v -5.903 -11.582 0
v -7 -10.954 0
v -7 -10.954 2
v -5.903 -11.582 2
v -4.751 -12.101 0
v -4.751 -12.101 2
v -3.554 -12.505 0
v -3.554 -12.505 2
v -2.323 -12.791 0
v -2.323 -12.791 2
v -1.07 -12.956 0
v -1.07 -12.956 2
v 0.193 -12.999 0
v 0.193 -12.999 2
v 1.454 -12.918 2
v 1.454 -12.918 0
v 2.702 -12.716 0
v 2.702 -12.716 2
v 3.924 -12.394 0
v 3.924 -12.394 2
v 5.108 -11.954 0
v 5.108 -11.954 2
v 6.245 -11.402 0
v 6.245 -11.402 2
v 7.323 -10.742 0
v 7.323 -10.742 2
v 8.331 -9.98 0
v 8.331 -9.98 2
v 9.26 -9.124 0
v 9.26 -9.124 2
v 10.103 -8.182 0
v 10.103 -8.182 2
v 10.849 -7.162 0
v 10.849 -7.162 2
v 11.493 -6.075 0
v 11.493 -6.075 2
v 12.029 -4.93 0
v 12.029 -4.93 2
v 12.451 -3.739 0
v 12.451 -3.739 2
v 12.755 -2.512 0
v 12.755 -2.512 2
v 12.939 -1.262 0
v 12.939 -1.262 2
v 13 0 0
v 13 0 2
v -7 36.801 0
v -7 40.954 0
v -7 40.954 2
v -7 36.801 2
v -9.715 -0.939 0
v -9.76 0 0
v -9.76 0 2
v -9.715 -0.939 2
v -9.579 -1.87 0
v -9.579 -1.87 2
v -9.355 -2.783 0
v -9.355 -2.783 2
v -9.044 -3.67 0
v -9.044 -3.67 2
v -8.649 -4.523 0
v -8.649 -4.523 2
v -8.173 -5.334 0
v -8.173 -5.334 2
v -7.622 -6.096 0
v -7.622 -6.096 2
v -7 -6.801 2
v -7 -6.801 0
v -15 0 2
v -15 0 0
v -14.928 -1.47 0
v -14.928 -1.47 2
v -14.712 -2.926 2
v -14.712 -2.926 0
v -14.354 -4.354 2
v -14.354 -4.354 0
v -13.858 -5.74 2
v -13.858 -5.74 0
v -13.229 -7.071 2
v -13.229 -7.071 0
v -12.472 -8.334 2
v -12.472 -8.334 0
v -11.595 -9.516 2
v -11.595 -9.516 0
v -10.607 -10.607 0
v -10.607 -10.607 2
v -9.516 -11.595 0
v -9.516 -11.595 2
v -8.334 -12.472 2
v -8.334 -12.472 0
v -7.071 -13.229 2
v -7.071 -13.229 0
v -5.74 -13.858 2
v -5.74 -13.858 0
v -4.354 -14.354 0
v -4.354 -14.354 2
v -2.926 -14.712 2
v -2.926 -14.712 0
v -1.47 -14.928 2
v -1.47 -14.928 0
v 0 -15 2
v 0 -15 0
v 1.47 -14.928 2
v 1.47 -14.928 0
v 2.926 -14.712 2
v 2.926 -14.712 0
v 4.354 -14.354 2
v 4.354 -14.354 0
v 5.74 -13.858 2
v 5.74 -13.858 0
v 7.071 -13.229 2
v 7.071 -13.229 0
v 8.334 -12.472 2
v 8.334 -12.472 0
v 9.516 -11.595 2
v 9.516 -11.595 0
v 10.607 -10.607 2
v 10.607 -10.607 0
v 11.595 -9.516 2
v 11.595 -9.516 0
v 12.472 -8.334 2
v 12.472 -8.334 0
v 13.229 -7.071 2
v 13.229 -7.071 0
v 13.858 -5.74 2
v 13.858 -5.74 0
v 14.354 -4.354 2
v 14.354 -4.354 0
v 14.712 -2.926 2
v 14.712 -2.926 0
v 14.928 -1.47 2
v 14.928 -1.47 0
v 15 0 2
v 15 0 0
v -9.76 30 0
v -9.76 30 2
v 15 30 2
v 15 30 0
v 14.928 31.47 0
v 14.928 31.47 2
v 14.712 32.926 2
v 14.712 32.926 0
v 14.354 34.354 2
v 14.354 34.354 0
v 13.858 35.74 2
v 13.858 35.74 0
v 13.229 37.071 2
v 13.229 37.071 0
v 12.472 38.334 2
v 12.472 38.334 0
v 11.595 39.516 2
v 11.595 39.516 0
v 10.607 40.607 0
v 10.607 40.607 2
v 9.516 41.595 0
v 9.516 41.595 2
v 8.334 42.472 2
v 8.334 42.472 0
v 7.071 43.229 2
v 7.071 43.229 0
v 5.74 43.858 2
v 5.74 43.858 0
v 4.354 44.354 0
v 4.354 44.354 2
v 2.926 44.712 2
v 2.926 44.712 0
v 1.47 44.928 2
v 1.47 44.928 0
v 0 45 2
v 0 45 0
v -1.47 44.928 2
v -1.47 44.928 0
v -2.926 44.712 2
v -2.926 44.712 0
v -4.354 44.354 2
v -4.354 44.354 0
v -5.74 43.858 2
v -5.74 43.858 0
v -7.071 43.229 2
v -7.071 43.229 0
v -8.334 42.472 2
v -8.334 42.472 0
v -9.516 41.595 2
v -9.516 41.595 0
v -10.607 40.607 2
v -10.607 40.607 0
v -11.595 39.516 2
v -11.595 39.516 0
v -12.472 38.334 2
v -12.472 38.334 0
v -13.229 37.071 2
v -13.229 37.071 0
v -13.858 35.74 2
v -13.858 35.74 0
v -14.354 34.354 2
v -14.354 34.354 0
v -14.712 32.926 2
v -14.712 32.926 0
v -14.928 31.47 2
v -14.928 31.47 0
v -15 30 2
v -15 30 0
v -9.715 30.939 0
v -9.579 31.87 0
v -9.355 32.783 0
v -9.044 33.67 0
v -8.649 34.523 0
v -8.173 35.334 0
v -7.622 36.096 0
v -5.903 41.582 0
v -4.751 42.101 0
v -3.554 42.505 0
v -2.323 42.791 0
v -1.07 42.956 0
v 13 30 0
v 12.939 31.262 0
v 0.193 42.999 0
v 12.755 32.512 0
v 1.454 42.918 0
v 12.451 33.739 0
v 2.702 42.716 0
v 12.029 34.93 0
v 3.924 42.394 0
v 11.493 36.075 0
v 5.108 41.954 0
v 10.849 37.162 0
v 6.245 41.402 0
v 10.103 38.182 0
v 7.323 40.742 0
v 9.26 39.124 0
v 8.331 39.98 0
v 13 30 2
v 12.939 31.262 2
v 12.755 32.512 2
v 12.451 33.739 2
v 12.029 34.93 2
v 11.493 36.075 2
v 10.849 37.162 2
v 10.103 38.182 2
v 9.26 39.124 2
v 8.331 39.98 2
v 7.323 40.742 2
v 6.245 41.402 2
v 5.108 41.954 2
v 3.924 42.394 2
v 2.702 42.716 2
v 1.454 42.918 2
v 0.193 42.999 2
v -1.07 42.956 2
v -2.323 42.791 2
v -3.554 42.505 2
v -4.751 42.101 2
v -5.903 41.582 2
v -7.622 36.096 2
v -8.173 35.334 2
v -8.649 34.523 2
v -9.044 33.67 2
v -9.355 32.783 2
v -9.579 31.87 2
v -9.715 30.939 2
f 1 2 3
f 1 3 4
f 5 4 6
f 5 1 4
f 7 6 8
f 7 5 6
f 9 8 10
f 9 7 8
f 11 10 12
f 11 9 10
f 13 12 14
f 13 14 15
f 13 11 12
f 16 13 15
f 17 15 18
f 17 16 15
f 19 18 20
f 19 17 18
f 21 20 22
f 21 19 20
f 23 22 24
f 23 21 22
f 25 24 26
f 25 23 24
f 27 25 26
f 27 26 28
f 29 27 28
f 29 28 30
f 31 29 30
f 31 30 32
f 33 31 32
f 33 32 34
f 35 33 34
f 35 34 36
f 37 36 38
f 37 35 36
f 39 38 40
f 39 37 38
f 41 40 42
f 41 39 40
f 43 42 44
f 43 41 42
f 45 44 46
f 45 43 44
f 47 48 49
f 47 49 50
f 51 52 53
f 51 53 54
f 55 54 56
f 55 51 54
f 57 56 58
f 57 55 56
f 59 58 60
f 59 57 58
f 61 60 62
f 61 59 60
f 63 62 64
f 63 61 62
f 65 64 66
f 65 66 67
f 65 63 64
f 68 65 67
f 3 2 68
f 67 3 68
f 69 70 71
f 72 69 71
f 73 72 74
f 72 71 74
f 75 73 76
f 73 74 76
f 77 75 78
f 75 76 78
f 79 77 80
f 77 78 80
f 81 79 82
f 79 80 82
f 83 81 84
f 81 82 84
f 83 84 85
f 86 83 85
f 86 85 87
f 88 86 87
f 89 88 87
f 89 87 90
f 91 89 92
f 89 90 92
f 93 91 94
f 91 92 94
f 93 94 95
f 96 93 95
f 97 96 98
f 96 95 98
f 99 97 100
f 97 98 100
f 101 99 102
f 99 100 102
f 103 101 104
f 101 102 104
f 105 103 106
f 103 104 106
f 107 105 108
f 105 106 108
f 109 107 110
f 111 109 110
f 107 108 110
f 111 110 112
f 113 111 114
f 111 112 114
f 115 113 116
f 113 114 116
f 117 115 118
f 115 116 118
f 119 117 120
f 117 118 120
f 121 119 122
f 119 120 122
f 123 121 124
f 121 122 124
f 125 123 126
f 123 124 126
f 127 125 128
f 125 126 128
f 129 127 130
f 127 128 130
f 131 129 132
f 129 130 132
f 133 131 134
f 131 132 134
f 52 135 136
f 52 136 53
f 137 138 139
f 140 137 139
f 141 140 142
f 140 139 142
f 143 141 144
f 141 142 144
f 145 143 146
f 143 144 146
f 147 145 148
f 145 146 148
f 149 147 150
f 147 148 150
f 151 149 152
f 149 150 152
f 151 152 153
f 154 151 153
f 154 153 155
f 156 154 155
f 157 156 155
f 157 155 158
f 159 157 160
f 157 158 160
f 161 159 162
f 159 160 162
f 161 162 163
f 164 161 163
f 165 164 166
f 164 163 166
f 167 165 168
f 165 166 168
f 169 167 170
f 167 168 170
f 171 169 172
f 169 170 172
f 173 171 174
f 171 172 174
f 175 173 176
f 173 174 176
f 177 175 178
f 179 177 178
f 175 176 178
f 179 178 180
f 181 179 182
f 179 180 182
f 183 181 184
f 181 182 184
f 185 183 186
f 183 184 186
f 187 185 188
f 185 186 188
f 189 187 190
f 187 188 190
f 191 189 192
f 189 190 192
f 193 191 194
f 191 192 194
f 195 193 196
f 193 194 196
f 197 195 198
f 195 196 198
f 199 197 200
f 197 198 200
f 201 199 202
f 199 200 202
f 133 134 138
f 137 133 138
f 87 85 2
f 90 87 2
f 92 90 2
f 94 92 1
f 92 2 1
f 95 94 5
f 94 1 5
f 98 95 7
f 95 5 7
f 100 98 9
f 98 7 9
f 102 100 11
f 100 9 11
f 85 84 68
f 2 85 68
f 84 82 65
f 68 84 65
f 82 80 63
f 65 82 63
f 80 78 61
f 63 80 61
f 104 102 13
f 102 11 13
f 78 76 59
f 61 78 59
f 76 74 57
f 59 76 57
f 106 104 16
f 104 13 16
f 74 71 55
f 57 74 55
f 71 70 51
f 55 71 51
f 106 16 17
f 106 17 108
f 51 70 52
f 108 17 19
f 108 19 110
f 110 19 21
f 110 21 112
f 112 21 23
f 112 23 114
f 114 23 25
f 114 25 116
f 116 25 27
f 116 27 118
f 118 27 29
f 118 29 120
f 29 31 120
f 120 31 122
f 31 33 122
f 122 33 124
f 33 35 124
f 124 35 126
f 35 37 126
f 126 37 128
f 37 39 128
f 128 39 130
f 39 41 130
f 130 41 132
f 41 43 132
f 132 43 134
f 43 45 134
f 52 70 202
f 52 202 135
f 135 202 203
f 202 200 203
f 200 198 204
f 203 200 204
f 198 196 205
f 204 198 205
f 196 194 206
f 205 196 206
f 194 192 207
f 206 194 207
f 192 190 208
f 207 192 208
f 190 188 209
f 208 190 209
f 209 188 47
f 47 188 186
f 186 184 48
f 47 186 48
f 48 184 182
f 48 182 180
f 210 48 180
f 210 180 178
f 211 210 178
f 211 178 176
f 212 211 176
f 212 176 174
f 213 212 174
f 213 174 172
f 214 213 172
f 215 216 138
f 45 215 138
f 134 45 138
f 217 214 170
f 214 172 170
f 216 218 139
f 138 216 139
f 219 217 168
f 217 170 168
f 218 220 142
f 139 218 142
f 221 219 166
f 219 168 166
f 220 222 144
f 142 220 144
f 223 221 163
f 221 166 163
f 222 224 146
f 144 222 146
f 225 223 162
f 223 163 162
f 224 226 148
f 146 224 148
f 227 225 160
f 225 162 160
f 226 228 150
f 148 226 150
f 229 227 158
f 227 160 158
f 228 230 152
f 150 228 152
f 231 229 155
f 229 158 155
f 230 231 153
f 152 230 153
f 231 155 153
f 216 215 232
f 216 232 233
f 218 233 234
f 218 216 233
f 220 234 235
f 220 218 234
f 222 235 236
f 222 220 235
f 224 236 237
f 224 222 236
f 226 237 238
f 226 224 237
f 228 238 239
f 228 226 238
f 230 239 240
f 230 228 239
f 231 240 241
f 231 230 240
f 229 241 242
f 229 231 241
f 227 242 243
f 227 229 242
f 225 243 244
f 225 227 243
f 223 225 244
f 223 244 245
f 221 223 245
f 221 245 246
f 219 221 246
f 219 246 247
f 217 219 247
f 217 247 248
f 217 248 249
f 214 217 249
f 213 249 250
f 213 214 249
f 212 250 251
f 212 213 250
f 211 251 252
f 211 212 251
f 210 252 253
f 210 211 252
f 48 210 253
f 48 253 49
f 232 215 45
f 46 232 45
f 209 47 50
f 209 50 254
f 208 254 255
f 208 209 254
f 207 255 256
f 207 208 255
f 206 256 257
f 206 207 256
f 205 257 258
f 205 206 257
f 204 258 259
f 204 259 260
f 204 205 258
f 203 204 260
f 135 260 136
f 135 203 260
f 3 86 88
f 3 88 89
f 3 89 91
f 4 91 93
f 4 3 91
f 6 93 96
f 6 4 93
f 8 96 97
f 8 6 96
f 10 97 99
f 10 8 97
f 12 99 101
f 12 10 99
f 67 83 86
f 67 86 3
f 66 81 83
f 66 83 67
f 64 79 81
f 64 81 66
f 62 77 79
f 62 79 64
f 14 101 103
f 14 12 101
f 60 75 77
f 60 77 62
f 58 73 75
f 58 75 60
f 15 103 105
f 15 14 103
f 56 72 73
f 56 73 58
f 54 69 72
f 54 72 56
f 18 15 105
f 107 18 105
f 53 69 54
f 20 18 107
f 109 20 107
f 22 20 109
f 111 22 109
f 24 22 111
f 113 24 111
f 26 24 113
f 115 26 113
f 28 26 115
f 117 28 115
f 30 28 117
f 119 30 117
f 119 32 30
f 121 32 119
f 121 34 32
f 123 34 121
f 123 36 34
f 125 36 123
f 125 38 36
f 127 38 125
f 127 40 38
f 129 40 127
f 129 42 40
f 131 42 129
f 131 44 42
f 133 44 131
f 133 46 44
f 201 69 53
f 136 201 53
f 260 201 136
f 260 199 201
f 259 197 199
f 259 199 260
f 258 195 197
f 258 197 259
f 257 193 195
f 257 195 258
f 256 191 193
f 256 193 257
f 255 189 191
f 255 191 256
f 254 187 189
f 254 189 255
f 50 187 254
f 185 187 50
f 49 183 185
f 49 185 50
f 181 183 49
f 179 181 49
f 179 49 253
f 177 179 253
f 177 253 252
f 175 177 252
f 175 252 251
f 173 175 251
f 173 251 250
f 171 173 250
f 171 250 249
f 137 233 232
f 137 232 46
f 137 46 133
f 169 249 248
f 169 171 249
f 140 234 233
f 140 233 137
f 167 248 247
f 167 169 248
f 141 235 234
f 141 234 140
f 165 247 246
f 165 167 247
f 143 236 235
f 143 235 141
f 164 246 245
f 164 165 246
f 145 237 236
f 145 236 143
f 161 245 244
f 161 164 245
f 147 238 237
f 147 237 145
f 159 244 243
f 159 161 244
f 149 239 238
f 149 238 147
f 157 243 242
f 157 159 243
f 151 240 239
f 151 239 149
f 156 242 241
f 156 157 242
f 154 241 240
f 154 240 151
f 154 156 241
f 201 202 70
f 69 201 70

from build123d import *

# Parameters (mm, degrees)
PAD_DEPTH = 2


with BuildPart() as part:
    # Sketch → Pad (new body)
    with BuildSketch(Plane.XY):
        with BuildLine():
            ThreePointArc((-15, 0), (0, -15), (15, 0))
            Line((15, 0), (15, 30))
            ThreePointArc((15, 30), (0, 45), (-15, 30))
            Line((-15, 30), (-15, 0))
        make_face()
        with BuildLine():
            ThreePointArc((-7, -10.954451), (6.244998, -11.401754), (13, 0))
            Line((13, 30), (13, 0))
            ThreePointArc((13, 30), (6.244998, 41.401754), (-7, 40.954451))
            Line((-7, 40.954451), (-7, 36.801294))
            ThreePointArc((-7, 36.801294), (-9.043716, 33.669986), (-9.76, 30))
            Line((-9.76, 30), (-9.76, 0))
            ThreePointArc((-9.76, 0), (-9.043716, -3.669986), (-7, -6.801294))
            Line((-7, -10.954451), (-7, -6.801294))
        make_face(mode=Mode.SUBTRACT)
    extrude(amount=PAD_DEPTH)


solid = part.part
